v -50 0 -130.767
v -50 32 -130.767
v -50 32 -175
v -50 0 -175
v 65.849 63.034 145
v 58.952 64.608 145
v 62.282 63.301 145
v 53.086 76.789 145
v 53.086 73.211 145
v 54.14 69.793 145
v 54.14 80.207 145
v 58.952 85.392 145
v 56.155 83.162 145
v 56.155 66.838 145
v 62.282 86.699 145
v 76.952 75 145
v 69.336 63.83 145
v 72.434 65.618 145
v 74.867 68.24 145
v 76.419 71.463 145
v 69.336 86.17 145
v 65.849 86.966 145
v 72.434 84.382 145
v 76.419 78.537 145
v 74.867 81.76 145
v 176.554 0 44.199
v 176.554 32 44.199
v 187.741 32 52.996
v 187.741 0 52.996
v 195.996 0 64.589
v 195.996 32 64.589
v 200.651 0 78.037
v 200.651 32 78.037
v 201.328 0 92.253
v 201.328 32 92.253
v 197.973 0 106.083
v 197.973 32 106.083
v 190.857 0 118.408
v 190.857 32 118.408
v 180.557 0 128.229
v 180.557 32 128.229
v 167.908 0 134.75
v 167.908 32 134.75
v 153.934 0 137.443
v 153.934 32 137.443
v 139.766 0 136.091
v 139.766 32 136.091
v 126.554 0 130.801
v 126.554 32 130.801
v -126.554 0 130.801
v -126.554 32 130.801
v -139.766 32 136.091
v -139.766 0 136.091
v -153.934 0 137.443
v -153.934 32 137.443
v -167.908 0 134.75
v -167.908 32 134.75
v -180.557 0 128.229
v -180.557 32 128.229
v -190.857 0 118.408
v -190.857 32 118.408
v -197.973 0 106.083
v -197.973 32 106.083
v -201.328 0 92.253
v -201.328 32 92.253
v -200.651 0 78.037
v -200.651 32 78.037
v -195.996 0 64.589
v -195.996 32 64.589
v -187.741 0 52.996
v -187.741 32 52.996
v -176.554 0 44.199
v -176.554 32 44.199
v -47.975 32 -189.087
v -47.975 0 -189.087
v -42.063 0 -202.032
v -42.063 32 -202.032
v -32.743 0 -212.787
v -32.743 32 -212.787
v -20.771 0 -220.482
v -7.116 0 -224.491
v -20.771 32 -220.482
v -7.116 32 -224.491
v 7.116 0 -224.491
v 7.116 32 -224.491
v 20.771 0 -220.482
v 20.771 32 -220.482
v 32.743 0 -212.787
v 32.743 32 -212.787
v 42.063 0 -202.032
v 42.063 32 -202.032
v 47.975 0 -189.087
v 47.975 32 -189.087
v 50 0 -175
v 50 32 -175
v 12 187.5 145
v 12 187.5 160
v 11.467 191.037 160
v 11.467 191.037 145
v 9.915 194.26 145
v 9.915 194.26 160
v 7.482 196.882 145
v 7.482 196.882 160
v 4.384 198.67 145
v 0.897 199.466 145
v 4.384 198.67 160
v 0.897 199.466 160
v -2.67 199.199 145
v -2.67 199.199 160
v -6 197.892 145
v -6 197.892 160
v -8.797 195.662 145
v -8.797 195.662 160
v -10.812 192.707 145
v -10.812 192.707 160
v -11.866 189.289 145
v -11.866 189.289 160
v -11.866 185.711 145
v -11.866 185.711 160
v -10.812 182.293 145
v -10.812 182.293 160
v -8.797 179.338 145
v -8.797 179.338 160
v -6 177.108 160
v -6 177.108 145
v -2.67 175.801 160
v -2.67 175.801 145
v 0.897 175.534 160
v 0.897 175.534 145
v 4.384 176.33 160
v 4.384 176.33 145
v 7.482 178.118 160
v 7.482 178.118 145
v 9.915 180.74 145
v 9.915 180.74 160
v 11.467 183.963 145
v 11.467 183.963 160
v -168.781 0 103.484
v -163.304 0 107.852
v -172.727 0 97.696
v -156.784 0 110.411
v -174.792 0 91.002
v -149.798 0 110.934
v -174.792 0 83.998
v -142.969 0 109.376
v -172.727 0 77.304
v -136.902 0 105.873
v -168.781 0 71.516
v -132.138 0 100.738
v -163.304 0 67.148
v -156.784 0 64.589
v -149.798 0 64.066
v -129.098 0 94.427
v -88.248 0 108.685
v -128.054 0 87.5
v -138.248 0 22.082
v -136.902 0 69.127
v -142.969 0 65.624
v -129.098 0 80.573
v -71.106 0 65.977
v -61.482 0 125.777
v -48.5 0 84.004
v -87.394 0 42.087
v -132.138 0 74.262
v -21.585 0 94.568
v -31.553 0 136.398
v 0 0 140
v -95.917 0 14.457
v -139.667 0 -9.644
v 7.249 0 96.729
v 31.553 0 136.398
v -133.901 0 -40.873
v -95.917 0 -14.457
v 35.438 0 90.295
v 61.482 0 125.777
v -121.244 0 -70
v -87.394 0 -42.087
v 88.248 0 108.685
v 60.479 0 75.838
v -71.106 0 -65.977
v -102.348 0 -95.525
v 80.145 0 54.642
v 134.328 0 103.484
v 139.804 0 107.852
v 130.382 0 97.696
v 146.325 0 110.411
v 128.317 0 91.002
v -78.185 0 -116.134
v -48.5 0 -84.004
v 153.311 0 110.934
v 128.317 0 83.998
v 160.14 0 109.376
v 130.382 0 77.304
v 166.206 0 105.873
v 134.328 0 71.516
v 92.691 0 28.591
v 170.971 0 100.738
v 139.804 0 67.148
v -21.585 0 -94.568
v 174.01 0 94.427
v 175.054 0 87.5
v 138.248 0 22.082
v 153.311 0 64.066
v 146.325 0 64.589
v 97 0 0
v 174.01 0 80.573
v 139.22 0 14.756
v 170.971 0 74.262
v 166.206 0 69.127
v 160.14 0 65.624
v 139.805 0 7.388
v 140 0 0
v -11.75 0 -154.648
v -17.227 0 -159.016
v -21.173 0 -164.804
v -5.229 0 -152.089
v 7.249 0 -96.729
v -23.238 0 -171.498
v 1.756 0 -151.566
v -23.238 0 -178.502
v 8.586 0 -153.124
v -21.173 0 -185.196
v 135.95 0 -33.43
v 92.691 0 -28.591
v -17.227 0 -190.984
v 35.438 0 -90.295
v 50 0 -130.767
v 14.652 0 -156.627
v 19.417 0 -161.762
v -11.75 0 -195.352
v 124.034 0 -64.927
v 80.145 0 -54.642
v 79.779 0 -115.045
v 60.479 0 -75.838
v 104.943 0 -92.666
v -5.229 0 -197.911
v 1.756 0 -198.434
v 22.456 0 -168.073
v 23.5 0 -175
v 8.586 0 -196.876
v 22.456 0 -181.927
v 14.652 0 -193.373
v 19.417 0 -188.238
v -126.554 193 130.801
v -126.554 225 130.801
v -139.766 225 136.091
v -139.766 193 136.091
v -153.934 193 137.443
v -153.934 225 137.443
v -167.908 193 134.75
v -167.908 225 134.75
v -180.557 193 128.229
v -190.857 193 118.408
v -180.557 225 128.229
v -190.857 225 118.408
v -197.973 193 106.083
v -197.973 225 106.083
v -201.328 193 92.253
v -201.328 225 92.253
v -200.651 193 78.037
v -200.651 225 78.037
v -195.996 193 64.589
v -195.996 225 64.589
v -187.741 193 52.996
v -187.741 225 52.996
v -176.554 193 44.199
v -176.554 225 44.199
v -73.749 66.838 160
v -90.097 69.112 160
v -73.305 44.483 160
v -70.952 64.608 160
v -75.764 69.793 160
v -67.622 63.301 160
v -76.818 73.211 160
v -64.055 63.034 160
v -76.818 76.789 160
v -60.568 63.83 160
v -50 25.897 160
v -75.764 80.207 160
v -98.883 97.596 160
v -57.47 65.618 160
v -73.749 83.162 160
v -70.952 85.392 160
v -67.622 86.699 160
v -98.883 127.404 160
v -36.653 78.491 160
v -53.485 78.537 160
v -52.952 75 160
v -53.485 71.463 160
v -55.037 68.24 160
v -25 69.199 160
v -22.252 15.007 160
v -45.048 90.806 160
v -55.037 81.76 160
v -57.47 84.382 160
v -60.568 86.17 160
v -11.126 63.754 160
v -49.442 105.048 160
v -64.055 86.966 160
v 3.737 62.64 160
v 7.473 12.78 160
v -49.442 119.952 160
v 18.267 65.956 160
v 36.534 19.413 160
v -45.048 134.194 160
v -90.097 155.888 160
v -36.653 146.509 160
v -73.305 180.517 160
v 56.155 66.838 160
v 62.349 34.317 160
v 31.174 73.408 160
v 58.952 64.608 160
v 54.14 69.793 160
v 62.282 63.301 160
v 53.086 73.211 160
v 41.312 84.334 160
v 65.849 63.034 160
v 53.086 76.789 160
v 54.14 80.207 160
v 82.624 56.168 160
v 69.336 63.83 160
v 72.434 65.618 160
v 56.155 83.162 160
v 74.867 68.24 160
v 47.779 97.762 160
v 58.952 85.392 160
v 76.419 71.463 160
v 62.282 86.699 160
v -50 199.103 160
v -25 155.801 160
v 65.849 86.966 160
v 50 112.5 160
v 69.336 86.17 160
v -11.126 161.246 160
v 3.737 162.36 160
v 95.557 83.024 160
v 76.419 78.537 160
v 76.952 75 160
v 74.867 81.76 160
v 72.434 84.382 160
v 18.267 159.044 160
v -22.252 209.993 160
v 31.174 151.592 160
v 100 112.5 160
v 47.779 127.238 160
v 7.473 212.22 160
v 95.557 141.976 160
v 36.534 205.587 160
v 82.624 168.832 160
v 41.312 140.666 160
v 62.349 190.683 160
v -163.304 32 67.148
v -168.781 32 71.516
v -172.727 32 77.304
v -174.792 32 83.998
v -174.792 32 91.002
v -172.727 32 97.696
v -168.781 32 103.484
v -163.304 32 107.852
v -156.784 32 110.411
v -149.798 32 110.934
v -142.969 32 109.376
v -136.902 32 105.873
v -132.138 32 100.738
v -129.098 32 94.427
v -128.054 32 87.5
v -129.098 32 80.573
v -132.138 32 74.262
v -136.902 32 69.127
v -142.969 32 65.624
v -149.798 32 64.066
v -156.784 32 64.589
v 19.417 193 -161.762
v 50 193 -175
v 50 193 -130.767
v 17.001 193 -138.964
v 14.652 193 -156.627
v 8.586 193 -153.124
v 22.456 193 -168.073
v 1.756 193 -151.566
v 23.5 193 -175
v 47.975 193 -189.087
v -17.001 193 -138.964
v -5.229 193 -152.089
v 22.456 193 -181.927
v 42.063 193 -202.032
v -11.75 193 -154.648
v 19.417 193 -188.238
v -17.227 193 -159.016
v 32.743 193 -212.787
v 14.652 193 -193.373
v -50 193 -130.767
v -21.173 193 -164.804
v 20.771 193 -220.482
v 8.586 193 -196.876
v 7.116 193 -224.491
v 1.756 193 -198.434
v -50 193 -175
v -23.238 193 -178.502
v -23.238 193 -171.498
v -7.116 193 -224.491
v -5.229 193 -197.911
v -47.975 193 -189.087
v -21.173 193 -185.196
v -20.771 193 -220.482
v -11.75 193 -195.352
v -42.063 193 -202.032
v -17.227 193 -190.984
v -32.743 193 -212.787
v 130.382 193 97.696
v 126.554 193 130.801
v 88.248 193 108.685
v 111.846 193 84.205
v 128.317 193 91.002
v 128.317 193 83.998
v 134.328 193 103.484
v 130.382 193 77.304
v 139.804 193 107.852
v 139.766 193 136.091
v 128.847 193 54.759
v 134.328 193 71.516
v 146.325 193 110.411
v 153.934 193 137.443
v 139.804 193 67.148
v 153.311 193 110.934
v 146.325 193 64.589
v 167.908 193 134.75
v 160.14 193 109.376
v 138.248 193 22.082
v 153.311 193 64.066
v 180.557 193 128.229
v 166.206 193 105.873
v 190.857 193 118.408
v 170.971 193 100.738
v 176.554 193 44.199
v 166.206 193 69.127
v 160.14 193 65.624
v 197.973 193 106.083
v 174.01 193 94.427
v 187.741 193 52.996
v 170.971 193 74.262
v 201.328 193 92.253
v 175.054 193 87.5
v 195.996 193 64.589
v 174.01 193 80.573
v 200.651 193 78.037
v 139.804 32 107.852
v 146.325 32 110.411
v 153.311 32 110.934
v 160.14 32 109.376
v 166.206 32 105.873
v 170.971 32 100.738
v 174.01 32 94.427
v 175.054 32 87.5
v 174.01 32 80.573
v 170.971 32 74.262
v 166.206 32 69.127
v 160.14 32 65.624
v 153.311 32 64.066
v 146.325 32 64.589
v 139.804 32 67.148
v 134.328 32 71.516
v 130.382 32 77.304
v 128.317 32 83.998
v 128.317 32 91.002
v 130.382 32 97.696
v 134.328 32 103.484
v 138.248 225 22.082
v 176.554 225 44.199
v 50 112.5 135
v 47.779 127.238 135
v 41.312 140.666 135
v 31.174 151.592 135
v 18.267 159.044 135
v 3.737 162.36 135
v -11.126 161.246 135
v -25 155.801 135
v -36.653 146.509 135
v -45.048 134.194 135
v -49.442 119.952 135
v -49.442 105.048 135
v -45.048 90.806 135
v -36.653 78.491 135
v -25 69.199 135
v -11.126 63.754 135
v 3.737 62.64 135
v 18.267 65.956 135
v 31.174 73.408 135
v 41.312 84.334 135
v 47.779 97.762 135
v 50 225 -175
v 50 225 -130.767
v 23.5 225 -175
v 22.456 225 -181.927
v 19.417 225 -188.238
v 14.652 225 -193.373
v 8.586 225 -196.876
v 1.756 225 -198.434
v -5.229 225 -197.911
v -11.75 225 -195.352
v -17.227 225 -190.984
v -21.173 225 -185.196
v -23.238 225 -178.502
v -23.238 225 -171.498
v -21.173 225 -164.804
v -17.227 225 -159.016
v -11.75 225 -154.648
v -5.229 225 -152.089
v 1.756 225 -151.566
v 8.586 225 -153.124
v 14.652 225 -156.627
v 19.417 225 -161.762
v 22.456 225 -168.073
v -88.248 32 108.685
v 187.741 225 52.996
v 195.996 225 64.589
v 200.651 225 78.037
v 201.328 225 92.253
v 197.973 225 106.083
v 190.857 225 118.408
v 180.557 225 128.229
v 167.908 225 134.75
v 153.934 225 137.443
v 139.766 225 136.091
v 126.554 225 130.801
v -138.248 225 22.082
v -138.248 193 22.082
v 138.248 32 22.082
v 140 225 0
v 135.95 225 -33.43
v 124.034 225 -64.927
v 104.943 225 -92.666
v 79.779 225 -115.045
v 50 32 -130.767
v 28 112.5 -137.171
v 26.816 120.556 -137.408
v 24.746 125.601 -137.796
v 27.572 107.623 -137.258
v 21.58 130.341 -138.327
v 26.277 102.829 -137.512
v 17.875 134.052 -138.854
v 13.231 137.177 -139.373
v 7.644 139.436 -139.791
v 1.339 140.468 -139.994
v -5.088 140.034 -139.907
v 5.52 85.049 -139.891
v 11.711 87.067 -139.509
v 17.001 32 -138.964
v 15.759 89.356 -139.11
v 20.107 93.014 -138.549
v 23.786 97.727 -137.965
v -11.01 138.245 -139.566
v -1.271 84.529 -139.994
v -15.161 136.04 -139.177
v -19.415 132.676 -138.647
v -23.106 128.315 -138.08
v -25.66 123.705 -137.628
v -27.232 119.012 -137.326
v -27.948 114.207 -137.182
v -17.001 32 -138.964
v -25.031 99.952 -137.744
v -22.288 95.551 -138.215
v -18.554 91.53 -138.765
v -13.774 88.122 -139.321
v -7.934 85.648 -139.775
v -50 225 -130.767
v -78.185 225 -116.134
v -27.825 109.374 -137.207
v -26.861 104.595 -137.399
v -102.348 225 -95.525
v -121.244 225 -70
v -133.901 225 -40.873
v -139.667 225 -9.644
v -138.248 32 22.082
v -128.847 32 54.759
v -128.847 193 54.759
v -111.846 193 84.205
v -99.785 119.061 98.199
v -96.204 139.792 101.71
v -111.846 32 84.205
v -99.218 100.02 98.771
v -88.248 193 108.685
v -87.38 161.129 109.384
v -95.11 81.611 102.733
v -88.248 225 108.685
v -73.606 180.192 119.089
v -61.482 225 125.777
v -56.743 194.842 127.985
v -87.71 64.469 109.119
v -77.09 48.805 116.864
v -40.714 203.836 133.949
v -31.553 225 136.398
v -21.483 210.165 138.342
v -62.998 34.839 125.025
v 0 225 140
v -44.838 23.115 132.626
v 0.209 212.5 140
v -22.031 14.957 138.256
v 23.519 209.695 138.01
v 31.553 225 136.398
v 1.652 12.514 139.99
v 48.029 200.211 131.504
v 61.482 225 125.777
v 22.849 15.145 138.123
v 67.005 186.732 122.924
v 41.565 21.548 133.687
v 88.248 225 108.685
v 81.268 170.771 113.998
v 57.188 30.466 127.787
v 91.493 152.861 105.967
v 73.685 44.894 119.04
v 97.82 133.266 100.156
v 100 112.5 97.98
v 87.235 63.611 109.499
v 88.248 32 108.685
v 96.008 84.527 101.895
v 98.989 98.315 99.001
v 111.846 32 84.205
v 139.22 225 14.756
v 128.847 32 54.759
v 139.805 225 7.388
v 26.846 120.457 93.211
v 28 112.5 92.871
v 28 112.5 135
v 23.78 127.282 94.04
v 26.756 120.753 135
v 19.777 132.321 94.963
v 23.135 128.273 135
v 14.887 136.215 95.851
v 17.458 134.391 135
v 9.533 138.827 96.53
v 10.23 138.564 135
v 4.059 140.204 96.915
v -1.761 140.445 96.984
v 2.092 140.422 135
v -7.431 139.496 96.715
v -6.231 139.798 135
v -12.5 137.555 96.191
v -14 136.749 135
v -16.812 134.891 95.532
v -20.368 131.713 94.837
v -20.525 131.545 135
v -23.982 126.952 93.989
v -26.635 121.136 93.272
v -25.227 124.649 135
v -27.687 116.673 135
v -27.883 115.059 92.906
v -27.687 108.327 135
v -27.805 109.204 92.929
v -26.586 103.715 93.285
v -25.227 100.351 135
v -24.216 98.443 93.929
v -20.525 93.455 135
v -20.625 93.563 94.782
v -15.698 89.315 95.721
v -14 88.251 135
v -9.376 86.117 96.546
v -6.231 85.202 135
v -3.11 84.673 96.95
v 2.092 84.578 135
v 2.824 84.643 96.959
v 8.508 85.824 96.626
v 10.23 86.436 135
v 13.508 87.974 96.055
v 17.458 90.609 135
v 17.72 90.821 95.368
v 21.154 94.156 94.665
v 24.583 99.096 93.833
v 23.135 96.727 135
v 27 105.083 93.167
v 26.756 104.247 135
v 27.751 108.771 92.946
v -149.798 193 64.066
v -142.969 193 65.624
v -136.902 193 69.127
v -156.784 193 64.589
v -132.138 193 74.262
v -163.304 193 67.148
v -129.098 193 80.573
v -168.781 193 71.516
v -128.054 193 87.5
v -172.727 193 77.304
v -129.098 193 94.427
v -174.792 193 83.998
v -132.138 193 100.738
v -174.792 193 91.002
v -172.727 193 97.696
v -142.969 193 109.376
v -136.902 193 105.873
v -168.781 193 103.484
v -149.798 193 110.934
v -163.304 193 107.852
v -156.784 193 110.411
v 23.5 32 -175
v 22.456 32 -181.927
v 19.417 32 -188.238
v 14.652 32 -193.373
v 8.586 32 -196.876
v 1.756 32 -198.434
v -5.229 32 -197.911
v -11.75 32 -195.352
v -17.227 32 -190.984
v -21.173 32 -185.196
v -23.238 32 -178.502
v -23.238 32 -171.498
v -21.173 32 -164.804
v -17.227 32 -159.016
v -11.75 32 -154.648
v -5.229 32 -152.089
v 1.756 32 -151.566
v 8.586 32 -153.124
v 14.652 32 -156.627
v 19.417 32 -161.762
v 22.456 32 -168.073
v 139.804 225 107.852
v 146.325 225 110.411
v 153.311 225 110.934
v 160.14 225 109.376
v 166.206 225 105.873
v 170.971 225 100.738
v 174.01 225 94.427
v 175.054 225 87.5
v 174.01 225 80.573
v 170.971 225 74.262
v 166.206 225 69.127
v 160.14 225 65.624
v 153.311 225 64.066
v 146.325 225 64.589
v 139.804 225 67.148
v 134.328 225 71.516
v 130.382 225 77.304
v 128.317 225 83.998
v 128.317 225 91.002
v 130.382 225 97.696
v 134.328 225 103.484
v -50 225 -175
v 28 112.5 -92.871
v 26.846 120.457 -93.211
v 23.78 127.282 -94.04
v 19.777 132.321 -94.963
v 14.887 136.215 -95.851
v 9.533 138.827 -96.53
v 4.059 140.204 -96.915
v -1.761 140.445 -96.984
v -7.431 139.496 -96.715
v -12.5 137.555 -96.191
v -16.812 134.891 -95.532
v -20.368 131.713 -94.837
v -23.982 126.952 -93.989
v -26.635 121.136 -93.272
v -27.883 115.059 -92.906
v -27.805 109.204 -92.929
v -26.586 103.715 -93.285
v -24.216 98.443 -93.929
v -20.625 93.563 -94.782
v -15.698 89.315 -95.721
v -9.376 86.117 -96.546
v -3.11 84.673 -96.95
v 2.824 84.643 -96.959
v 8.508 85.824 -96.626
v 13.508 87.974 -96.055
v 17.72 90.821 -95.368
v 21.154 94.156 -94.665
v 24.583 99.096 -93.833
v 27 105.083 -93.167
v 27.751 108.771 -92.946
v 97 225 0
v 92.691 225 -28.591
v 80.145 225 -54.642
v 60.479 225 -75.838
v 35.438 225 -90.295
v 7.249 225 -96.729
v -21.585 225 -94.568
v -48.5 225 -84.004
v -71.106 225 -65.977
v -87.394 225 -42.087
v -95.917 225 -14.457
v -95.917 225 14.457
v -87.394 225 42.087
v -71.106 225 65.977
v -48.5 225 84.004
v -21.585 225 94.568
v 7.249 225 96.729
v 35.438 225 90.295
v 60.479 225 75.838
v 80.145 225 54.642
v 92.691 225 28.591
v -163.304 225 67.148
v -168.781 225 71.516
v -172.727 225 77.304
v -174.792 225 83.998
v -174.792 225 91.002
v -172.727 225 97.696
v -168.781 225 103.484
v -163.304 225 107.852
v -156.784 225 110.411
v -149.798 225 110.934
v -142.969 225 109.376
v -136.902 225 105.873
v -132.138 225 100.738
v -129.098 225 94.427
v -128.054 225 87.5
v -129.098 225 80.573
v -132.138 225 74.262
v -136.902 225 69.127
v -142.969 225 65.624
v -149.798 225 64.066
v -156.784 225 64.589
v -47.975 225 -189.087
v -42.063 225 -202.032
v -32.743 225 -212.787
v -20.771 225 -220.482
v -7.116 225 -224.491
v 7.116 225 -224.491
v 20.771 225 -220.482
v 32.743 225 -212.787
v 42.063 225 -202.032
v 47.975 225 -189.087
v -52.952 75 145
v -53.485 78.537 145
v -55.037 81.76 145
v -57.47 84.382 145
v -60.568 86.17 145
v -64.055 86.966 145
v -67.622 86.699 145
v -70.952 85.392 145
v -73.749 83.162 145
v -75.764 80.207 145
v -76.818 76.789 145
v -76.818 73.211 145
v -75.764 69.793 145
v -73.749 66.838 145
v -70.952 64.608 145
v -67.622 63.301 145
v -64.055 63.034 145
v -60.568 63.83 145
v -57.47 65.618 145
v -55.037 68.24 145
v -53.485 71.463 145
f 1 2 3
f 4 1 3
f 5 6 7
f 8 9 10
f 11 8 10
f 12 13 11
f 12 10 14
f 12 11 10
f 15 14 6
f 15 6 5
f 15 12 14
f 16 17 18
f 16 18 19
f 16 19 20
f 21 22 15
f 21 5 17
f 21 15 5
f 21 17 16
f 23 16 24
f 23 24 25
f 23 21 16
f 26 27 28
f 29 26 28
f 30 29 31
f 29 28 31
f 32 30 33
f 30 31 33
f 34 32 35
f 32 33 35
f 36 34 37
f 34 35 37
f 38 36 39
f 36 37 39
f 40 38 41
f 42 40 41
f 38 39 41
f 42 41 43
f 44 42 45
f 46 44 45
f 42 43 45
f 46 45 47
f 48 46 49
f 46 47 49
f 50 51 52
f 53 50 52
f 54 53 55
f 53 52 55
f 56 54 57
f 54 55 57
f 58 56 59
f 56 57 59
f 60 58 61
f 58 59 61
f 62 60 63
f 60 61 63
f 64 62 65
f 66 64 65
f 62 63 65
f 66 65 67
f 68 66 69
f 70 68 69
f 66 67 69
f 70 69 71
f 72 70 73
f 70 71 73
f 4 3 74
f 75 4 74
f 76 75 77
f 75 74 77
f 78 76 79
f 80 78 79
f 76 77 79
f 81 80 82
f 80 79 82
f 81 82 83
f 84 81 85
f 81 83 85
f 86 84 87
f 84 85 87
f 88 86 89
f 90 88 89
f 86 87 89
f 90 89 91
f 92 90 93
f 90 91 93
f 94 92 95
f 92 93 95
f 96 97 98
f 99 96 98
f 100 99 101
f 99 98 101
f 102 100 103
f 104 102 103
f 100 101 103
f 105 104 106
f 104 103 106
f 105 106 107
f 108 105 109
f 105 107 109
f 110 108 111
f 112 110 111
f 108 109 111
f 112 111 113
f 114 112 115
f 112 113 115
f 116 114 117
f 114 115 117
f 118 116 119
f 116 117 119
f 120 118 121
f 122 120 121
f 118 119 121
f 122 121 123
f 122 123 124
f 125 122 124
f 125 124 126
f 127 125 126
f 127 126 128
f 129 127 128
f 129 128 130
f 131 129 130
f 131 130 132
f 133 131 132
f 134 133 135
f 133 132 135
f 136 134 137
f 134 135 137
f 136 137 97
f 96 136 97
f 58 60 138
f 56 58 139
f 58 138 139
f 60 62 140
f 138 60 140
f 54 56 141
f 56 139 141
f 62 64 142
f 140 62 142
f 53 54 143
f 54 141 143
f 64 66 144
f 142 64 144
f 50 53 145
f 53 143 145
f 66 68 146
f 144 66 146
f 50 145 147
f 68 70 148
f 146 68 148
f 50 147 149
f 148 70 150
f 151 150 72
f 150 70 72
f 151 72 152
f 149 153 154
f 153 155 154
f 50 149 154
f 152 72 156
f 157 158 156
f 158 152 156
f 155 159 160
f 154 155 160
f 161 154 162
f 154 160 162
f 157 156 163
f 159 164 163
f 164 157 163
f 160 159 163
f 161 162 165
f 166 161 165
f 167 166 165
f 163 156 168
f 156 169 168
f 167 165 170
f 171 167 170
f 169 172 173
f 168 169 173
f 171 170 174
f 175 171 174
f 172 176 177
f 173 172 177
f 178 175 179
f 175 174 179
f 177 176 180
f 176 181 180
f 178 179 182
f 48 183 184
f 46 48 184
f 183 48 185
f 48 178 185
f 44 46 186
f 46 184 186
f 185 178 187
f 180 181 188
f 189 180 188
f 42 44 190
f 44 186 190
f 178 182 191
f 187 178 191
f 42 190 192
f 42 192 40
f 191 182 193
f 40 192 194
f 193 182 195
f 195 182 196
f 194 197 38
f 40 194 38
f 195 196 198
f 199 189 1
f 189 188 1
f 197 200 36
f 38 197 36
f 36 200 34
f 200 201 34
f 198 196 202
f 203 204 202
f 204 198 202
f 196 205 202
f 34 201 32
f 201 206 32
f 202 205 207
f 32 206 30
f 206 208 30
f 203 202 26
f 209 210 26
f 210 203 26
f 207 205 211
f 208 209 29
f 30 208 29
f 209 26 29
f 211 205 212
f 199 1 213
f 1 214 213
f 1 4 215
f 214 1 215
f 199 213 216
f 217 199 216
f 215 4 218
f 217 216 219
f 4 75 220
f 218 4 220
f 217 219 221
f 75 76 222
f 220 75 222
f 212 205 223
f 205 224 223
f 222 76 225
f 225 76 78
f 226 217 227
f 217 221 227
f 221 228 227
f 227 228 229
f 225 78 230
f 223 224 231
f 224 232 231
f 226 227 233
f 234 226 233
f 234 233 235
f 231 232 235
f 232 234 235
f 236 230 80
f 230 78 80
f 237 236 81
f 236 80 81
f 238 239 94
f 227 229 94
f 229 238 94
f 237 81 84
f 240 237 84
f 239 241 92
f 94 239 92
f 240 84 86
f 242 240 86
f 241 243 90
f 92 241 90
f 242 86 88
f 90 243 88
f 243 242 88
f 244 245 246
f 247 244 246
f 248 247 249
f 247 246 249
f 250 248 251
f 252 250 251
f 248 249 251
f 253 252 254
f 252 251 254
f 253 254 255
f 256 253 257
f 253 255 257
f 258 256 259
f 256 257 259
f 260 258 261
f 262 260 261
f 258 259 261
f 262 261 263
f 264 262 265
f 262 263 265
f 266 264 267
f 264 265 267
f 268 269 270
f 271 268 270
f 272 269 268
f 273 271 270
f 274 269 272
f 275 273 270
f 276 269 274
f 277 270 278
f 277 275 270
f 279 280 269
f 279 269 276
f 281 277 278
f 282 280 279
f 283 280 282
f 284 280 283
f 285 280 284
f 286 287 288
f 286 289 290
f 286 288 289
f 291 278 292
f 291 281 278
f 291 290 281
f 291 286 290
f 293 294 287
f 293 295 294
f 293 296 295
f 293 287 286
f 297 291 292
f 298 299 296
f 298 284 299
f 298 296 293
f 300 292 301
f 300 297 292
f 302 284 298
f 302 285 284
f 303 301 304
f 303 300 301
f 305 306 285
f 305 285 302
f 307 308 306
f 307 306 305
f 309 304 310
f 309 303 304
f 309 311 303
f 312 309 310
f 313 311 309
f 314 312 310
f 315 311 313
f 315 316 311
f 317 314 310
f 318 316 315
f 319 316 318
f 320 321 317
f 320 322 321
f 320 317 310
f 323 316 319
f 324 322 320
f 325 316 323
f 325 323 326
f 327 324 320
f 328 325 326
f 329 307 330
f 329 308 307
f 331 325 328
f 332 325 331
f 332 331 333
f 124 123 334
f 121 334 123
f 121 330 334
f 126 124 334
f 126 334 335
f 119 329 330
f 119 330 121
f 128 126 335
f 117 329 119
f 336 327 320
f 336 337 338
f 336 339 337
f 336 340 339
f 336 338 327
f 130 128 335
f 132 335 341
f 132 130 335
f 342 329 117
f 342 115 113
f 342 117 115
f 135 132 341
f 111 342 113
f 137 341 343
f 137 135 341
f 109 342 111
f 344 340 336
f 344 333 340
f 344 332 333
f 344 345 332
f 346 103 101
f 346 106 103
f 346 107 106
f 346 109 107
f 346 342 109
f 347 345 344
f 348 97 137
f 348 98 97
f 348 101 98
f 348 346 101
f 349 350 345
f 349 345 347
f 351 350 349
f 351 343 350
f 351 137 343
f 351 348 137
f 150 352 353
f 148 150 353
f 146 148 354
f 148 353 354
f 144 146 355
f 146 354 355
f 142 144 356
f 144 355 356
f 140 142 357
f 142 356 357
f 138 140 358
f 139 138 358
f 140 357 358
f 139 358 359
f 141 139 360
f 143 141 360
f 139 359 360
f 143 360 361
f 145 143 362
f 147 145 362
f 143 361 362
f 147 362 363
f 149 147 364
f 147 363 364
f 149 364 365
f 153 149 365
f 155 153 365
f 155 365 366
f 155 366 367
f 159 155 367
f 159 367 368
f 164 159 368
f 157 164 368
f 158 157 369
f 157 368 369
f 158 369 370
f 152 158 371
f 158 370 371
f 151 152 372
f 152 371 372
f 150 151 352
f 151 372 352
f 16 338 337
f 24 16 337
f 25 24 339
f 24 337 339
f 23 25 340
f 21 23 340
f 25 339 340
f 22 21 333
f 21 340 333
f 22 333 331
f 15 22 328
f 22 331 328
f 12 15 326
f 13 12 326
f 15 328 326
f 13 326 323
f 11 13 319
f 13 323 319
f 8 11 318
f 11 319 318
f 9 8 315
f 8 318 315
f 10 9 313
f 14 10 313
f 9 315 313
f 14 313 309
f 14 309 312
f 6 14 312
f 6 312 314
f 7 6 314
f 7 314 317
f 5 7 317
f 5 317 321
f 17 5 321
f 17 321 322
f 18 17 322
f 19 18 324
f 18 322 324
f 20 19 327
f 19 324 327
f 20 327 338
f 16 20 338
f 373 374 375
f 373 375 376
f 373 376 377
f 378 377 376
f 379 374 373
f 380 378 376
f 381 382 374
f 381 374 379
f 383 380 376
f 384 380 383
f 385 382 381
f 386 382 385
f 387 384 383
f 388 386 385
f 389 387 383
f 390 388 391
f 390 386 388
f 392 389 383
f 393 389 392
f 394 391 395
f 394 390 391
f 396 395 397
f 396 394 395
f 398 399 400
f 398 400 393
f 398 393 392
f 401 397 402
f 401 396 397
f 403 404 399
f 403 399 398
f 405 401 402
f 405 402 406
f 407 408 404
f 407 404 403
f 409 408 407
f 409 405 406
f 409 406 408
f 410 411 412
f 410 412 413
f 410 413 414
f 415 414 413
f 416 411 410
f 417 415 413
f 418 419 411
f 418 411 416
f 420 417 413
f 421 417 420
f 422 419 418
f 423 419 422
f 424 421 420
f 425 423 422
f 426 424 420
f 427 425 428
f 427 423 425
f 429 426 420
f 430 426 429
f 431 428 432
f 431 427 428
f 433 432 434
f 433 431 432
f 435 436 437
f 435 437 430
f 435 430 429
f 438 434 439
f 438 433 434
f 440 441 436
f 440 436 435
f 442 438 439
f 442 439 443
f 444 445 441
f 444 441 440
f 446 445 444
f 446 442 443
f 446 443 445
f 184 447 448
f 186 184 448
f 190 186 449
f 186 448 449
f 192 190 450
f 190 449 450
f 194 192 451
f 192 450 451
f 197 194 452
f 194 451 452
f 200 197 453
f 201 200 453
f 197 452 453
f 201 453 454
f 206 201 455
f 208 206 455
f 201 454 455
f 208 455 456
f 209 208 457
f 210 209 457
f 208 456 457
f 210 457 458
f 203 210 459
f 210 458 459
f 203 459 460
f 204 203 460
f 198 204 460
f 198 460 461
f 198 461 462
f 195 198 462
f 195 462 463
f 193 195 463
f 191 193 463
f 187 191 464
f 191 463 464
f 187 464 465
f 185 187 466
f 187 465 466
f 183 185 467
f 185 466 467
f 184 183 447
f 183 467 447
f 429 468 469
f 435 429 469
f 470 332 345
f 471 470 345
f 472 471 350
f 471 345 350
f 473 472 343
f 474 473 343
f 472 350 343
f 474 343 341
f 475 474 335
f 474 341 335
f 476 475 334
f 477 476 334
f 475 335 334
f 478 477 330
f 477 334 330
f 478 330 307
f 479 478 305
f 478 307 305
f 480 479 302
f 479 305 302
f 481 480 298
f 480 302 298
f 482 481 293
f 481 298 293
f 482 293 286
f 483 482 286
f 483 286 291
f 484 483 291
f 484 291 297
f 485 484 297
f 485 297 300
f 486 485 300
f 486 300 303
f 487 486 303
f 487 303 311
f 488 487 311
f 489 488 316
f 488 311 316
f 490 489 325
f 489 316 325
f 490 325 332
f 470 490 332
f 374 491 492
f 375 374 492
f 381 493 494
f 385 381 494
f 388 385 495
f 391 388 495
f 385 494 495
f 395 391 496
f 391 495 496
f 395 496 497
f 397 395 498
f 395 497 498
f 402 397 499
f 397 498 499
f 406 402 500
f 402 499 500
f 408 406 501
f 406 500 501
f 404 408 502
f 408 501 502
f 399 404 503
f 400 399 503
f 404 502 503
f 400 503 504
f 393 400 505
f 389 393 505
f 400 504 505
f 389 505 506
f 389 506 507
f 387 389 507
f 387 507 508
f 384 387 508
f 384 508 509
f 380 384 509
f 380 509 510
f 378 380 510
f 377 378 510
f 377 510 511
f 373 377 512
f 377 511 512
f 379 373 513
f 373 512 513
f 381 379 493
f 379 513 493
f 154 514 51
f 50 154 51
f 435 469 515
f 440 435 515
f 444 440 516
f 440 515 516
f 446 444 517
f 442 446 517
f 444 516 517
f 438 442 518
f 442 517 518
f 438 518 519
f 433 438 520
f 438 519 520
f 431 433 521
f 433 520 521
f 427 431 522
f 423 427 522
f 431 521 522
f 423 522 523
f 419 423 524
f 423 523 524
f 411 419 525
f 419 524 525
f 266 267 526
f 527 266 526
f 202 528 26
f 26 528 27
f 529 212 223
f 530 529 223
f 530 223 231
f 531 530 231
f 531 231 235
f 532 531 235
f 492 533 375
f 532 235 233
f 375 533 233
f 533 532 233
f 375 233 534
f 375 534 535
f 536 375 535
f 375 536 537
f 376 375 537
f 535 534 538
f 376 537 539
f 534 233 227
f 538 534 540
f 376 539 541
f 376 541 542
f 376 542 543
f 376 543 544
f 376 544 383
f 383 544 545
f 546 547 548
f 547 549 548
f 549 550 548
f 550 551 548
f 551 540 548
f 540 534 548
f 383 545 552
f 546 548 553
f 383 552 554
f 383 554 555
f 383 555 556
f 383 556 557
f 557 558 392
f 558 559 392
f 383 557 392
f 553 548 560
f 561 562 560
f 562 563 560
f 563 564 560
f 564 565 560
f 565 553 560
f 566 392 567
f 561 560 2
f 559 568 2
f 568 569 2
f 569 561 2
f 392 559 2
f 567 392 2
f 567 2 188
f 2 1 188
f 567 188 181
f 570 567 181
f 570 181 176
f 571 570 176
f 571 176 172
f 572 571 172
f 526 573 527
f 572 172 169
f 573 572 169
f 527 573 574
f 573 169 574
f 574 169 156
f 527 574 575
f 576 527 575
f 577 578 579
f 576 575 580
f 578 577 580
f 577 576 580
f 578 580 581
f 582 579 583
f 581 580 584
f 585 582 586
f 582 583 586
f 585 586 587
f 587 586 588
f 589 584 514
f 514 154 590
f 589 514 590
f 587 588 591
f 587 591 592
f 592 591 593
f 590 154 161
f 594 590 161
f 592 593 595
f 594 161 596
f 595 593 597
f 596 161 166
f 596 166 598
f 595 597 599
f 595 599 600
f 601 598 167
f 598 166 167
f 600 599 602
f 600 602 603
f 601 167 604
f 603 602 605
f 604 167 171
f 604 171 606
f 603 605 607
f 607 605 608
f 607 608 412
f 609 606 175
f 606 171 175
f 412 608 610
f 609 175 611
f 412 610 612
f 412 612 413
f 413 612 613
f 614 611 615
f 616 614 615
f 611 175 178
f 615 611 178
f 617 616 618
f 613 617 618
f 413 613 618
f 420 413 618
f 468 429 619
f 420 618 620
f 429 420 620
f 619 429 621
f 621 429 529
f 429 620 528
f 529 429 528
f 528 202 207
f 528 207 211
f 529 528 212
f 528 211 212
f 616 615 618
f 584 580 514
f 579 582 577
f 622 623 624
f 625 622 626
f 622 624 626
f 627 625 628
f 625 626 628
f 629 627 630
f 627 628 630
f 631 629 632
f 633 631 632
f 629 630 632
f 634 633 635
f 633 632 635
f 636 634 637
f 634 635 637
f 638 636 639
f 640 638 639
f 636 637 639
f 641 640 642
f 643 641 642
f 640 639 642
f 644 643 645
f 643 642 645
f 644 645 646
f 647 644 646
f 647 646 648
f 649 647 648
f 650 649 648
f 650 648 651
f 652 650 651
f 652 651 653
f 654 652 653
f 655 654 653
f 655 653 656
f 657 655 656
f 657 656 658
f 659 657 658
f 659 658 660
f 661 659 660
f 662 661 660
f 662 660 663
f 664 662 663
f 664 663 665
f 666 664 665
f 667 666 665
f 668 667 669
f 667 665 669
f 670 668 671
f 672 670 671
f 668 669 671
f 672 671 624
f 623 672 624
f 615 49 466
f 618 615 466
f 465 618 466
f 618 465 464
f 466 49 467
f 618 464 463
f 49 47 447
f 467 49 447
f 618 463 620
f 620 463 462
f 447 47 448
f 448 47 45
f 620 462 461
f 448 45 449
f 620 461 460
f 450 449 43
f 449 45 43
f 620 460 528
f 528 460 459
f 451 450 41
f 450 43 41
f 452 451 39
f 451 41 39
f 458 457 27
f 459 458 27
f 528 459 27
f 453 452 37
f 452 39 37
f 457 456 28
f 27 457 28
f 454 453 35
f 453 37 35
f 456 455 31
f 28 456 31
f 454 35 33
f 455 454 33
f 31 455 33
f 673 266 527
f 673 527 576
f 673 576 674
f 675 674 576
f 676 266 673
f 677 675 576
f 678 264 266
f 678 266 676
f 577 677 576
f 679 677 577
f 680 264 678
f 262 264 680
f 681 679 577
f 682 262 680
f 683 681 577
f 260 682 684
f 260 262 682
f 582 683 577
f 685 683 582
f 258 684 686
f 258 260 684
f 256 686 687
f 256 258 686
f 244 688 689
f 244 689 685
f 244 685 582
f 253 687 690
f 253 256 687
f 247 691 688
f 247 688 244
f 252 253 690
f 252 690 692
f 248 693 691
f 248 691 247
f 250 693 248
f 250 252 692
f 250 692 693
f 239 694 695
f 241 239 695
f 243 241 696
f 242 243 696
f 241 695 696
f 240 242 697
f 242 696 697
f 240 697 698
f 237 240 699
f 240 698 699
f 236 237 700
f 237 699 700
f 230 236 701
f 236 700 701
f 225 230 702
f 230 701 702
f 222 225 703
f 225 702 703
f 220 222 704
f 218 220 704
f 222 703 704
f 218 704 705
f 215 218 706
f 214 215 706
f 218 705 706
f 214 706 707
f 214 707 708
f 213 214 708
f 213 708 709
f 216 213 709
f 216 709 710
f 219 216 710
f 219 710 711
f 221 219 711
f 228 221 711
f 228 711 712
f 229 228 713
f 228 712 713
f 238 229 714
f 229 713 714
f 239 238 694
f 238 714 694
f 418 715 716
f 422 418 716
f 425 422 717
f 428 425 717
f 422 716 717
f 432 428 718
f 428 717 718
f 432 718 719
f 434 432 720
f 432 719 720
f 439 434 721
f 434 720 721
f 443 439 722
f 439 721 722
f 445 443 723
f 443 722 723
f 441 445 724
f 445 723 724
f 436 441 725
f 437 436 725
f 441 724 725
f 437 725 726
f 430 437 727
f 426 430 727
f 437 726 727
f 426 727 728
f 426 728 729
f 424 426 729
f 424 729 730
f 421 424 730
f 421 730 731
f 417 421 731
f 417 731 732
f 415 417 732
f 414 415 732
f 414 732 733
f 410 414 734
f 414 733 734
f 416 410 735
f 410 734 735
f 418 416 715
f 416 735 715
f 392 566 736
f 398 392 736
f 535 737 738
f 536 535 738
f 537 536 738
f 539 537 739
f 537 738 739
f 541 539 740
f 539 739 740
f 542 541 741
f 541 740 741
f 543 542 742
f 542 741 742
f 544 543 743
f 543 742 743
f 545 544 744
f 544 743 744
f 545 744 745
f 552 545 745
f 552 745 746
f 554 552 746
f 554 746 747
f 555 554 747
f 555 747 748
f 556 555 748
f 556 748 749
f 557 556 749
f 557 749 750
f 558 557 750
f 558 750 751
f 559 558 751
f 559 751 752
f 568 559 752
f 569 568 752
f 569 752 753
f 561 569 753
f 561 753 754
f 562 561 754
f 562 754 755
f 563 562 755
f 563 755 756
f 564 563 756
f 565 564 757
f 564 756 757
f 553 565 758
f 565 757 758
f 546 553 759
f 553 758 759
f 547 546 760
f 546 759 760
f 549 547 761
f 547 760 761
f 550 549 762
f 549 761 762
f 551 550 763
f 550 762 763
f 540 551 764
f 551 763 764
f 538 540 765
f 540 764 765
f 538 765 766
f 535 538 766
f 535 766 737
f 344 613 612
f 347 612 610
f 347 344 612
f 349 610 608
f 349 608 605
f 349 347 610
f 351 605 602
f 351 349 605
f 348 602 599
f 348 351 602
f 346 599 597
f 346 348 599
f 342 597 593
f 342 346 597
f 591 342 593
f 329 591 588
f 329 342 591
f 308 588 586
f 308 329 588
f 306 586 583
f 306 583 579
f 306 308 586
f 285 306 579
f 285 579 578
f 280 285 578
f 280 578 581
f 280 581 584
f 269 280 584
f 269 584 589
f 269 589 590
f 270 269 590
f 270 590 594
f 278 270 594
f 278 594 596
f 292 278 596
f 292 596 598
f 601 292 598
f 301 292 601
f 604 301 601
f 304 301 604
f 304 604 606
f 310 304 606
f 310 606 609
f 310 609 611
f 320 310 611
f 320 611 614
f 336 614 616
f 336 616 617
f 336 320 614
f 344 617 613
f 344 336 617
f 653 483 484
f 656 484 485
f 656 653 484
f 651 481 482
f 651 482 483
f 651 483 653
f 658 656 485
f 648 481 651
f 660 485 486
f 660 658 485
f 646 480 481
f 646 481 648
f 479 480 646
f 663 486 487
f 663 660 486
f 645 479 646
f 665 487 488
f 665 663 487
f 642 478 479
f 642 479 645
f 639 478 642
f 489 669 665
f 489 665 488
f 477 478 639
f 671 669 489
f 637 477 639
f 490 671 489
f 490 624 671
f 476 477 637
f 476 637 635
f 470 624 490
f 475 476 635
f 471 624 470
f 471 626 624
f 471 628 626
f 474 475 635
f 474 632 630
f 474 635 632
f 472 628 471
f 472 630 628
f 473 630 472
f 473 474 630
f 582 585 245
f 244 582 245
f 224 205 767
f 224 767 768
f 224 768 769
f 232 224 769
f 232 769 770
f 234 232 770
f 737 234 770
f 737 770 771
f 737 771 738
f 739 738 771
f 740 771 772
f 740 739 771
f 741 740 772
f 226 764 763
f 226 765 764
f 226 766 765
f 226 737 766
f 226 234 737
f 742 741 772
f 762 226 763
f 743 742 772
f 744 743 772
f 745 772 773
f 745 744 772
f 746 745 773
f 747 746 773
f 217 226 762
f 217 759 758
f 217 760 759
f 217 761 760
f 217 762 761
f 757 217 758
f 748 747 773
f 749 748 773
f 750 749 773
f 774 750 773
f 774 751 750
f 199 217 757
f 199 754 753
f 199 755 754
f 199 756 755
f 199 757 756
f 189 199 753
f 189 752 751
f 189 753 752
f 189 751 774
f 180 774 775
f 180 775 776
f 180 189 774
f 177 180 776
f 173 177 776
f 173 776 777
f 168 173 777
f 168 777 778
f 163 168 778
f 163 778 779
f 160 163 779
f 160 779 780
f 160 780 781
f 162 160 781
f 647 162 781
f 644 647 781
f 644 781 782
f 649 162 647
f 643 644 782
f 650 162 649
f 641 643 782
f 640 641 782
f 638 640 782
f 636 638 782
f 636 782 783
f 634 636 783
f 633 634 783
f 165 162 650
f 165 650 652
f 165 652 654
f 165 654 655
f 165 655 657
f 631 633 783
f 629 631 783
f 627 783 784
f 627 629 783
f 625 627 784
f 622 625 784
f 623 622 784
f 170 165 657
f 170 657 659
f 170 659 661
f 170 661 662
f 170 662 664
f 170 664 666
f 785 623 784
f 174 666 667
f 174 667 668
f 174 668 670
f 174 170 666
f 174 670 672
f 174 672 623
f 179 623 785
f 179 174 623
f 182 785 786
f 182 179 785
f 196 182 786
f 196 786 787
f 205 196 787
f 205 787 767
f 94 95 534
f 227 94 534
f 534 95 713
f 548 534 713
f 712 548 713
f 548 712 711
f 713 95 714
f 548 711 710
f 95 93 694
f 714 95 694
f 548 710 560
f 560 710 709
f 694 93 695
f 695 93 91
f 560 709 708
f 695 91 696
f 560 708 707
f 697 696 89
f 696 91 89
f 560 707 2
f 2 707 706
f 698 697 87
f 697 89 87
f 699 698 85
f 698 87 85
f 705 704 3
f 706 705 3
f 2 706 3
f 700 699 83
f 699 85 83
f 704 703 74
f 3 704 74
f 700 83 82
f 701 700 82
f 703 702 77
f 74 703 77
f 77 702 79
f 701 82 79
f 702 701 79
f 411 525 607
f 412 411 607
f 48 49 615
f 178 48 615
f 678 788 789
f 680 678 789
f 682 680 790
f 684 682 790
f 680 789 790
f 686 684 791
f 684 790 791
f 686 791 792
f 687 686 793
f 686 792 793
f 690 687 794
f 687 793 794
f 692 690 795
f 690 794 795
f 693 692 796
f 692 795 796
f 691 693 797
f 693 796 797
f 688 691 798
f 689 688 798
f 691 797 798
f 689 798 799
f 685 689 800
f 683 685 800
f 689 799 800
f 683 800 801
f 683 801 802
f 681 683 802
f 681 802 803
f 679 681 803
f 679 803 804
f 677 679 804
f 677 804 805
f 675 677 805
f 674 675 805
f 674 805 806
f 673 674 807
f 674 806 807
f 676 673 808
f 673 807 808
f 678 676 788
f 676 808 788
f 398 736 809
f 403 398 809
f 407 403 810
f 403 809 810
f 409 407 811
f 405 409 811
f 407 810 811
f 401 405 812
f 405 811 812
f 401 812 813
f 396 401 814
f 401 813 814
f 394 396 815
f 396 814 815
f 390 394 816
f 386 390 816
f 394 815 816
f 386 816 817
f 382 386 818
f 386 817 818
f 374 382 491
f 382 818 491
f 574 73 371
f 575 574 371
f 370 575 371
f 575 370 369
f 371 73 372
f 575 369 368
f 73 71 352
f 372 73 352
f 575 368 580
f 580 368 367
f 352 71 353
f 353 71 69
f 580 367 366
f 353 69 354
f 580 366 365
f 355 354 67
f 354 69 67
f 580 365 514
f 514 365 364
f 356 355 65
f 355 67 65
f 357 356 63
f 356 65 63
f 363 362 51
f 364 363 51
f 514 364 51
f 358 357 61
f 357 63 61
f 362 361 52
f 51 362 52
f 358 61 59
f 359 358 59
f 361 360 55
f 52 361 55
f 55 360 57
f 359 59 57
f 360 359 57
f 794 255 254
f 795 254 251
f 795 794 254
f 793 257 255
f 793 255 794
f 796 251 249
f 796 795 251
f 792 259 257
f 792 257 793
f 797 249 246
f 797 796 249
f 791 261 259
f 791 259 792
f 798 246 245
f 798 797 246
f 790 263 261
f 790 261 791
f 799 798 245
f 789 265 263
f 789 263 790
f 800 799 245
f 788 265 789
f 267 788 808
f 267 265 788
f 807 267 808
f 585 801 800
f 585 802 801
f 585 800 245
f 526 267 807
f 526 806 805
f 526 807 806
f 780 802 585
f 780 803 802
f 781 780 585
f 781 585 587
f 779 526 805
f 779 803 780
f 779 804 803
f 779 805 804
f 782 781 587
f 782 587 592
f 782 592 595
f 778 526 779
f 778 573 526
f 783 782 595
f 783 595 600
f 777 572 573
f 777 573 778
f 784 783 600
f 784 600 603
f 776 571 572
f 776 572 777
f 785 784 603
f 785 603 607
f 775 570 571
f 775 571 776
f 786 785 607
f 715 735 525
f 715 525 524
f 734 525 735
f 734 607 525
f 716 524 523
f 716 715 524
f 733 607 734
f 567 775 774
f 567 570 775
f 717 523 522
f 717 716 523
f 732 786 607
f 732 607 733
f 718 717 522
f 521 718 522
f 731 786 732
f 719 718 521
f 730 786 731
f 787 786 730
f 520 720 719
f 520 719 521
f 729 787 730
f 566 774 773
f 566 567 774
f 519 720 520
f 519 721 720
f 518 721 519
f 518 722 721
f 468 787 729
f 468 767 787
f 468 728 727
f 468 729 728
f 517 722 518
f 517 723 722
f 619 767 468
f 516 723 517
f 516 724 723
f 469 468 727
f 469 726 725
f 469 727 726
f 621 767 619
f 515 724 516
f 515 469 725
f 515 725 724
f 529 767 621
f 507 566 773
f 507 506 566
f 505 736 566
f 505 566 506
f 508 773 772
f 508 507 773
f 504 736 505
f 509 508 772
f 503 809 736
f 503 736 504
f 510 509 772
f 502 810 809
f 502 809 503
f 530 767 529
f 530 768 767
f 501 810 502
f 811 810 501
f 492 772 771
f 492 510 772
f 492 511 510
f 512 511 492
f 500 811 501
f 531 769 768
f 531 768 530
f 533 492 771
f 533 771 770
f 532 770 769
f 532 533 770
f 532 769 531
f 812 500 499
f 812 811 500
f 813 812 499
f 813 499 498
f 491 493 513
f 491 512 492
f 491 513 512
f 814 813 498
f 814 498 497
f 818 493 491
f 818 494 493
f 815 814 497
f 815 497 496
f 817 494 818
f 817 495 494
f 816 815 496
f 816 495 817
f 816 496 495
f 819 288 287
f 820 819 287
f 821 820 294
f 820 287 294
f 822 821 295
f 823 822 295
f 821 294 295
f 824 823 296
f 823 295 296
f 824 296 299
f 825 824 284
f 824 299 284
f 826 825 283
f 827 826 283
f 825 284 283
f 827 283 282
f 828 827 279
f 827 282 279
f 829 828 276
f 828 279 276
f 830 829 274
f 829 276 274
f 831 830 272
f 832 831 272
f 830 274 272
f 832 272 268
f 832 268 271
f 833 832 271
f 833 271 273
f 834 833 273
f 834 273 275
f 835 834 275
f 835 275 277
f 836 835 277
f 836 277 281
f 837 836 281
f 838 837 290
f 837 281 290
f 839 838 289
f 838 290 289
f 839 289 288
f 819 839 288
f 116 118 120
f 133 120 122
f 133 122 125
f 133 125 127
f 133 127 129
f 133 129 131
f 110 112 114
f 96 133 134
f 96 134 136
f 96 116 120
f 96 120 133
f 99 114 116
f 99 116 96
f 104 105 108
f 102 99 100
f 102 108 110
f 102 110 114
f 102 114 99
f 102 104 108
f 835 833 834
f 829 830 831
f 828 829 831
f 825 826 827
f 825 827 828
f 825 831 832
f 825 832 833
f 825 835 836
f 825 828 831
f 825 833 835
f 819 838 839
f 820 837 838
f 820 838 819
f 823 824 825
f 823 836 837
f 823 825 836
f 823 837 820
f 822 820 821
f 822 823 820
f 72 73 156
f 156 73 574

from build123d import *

# Parameters (mm, degrees)
SKETCH1_R                   = 140
SKETCH1_R_2                 = 97
BOSS_EXTRUDE1_DEPTH         = 225
SKETCH2_R                   = 23.5
BOSS_EXTRUDE2_DEPTH         = 32
CIRPATTERN1_COUNT           = 3
LPATTERN2_COUNT             = 2
LPATTERN2_PITCH             = 193
CIRPATTERN2_COPY_1_SKETCH_R = 23.5
CIRPATTERN2_COPY_1_DEPTH    = 32
CIRPATTERN2_COPY_2_SKETCH_R = 23.5
CIRPATTERN2_COPY_2_DEPTH    = 32
CIRPATTERN2_COPY_3_SKETCH_R = 23.5
CIRPATTERN2_COPY_3_DEPTH    = 32
CIRPATTERN2_COPY_4_SKETCH_R = 23.5
CIRPATTERN2_COPY_4_DEPTH    = 32
BOSS_EXTRUDE3_REACH         = 387
SKETCH3_R                   = 100
SKETCH4_R                   = 28
CUT_EXTRUDE1_DEPTH          = 386
SKETCH5_R                   = 50
CUT_EXTRUDE2_DEPTH          = 25
SKETCH6_R                   = 12
CUT_EXTRUDE3_DEPTH          = 15


with BuildPart() as part:
    # Sketch1 → Boss-Extrude1 (new body)
    with BuildSketch(Plane(origin=(0, 0, 0), x_dir=(1, 0, 0), z_dir=(0, 1, 0))):
        Circle(SKETCH1_R)
        Circle(SKETCH1_R_2, mode=Mode.SUBTRACT)
    extrude(amount=BOSS_EXTRUDE1_DEPTH)

    # Sketch2 → Boss-Extrude2 (add)
    with BuildSketch(Plane(origin=(0, 225, 0), x_dir=(1, 0, 0), z_dir=(0, 1, 0))):
        with BuildLine():
            Line((-50, 130.766968306), (-50, 175))
            ThreePointArc((-50, 175), (0, 225), (50, 175))
            Line((50, 175), (50, 130.766968306))
            ThreePointArc((50, 130.766968306), (0, 140), (-50, 130.766968306))
        make_face()
        with Locations((0, 175)):
            Circle(SKETCH2_R, mode=Mode.SUBTRACT)
    boss_extrude2 = extrude(amount=-BOSS_EXTRUDE2_DEPTH)

    # CirPattern1: Boss-Extrude2 ×3 about axis
    cirpattern1_axis = Axis((0, 0, 0), (0, 1, 0))
    for i in range(1, CIRPATTERN1_COUNT):
        add(boss_extrude2.rotate(cirpattern1_axis, i * 360 / CIRPATTERN1_COUNT))

    # LPattern2: Boss-Extrude2 ×2
    with Locations(*[(0, -i * LPATTERN2_PITCH, 0) for i in range(1, LPATTERN2_COUNT)]):
        add(boss_extrude2)

    # CirPattern2 copy 1 sketch → CirPattern2 copy 1 (add)
    with BuildSketch(Plane(origin=(0, 32, 0), x_dir=(-0.5, 0, -0.866025404), z_dir=(0, 1, 0))):
        with BuildLine():
            Line((-50, 130.766968306), (-50, 175))
            ThreePointArc((-50, 175), (0, 225), (50, 175))
            Line((50, 175), (50, 130.766968306))
            ThreePointArc((50, 130.766968306), (0, 140), (-50, 130.766968306))
        make_face()
        with Locations((0, 175)):
            Circle(CIRPATTERN2_COPY_1_SKETCH_R, mode=Mode.SUBTRACT)
    extrude(amount=-CIRPATTERN2_COPY_1_DEPTH)

    # CirPattern2 copy 2 sketch → CirPattern2 copy 2 (add)
    with BuildSketch(Plane(origin=(0, 32, 0), x_dir=(-0.5, 0, 0.866025404), z_dir=(0, 1, 0))):
        with BuildLine():
            Line((-50, 130.766968306), (-50, 175))
            ThreePointArc((-50, 175), (0, 225), (50, 175))
            Line((50, 175), (50, 130.766968306))
            ThreePointArc((50, 130.766968306), (0, 140), (-50, 130.766968306))
        make_face()
        with Locations((0, 175)):
            Circle(CIRPATTERN2_COPY_2_SKETCH_R, mode=Mode.SUBTRACT)
    extrude(amount=-CIRPATTERN2_COPY_2_DEPTH)

    # CirPattern2 copy 3 sketch → CirPattern2 copy 3 (add)
    with BuildSketch(Plane(origin=(0, 225, 0), x_dir=(-0.5, 0, -0.866025404), z_dir=(0, 1, 0))):
        with BuildLine():
            Line((-50, 130.766968306), (-50, 175))
            ThreePointArc((-50, 175), (0, 225), (50, 175))
            Line((50, 175), (50, 130.766968306))
            ThreePointArc((50, 130.766968306), (0, 140), (-50, 130.766968306))
        make_face()
        with Locations((0, 175)):
            Circle(CIRPATTERN2_COPY_3_SKETCH_R, mode=Mode.SUBTRACT)
    extrude(amount=-CIRPATTERN2_COPY_3_DEPTH)

    # CirPattern2 copy 4 sketch → CirPattern2 copy 4 (add)
    with BuildSketch(Plane(origin=(0, 225, 0), x_dir=(-0.5, 0, 0.866025404), z_dir=(0, 1, 0))):
        with BuildLine():
            Line((-50, 130.766968306), (-50, 175))
            ThreePointArc((-50, 175), (0, 225), (50, 175))
            Line((50, 175), (50, 130.766968306))
            ThreePointArc((50, 130.766968306), (0, 140), (-50, 130.766968306))
        make_face()
        with Locations((0, 175)):
            Circle(CIRPATTERN2_COPY_4_SKETCH_R, mode=Mode.SUBTRACT)
    extrude(amount=-CIRPATTERN2_COPY_4_DEPTH)

    # Sketch3 → Boss-Extrude3 (add, up to next)
    with BuildSketch(Plane.XY.offset(160), mode=Mode.PRIVATE) as boss_extrude3_sk1:
        with Locations((0, 112.5)):
            Circle(SKETCH3_R)
    boss_extrude3_tool1 = extrude(boss_extrude3_sk1.sketch, amount=-BOSS_EXTRUDE3_REACH, mode=Mode.PRIVATE) - part.part
    add(boss_extrude3_tool1.solids().sort_by_distance((0, 112.5, 160))[0])

    # Sketch4 → Cut-Extrude1 (cut, through all)
    with BuildSketch(Plane.XY.offset(160)):
        with Locations((0, 112.5)):
            Circle(SKETCH4_R)
    extrude(amount=-CUT_EXTRUDE1_DEPTH, mode=Mode.SUBTRACT)

    # Sketch5 → Cut-Extrude2 (cut)
    with BuildSketch(Plane.XY.offset(160)):
        with Locations((0, 112.5)):
            Circle(SKETCH5_R)
    extrude(amount=-CUT_EXTRUDE2_DEPTH, mode=Mode.SUBTRACT)

    # Sketch6 → Cut-Extrude3 (cut)
    with BuildSketch(Plane.XY.offset(160)):
        with Locations((0, 187.5)):
            Circle(SKETCH6_R)
        with Locations((64.951905284, 75)):
            Circle(SKETCH6_R)
        with Locations((-64.951905284, 75)):
            Circle(SKETCH6_R)
    extrude(amount=-CUT_EXTRUDE3_DEPTH, mode=Mode.SUBTRACT)


solid = part.part
